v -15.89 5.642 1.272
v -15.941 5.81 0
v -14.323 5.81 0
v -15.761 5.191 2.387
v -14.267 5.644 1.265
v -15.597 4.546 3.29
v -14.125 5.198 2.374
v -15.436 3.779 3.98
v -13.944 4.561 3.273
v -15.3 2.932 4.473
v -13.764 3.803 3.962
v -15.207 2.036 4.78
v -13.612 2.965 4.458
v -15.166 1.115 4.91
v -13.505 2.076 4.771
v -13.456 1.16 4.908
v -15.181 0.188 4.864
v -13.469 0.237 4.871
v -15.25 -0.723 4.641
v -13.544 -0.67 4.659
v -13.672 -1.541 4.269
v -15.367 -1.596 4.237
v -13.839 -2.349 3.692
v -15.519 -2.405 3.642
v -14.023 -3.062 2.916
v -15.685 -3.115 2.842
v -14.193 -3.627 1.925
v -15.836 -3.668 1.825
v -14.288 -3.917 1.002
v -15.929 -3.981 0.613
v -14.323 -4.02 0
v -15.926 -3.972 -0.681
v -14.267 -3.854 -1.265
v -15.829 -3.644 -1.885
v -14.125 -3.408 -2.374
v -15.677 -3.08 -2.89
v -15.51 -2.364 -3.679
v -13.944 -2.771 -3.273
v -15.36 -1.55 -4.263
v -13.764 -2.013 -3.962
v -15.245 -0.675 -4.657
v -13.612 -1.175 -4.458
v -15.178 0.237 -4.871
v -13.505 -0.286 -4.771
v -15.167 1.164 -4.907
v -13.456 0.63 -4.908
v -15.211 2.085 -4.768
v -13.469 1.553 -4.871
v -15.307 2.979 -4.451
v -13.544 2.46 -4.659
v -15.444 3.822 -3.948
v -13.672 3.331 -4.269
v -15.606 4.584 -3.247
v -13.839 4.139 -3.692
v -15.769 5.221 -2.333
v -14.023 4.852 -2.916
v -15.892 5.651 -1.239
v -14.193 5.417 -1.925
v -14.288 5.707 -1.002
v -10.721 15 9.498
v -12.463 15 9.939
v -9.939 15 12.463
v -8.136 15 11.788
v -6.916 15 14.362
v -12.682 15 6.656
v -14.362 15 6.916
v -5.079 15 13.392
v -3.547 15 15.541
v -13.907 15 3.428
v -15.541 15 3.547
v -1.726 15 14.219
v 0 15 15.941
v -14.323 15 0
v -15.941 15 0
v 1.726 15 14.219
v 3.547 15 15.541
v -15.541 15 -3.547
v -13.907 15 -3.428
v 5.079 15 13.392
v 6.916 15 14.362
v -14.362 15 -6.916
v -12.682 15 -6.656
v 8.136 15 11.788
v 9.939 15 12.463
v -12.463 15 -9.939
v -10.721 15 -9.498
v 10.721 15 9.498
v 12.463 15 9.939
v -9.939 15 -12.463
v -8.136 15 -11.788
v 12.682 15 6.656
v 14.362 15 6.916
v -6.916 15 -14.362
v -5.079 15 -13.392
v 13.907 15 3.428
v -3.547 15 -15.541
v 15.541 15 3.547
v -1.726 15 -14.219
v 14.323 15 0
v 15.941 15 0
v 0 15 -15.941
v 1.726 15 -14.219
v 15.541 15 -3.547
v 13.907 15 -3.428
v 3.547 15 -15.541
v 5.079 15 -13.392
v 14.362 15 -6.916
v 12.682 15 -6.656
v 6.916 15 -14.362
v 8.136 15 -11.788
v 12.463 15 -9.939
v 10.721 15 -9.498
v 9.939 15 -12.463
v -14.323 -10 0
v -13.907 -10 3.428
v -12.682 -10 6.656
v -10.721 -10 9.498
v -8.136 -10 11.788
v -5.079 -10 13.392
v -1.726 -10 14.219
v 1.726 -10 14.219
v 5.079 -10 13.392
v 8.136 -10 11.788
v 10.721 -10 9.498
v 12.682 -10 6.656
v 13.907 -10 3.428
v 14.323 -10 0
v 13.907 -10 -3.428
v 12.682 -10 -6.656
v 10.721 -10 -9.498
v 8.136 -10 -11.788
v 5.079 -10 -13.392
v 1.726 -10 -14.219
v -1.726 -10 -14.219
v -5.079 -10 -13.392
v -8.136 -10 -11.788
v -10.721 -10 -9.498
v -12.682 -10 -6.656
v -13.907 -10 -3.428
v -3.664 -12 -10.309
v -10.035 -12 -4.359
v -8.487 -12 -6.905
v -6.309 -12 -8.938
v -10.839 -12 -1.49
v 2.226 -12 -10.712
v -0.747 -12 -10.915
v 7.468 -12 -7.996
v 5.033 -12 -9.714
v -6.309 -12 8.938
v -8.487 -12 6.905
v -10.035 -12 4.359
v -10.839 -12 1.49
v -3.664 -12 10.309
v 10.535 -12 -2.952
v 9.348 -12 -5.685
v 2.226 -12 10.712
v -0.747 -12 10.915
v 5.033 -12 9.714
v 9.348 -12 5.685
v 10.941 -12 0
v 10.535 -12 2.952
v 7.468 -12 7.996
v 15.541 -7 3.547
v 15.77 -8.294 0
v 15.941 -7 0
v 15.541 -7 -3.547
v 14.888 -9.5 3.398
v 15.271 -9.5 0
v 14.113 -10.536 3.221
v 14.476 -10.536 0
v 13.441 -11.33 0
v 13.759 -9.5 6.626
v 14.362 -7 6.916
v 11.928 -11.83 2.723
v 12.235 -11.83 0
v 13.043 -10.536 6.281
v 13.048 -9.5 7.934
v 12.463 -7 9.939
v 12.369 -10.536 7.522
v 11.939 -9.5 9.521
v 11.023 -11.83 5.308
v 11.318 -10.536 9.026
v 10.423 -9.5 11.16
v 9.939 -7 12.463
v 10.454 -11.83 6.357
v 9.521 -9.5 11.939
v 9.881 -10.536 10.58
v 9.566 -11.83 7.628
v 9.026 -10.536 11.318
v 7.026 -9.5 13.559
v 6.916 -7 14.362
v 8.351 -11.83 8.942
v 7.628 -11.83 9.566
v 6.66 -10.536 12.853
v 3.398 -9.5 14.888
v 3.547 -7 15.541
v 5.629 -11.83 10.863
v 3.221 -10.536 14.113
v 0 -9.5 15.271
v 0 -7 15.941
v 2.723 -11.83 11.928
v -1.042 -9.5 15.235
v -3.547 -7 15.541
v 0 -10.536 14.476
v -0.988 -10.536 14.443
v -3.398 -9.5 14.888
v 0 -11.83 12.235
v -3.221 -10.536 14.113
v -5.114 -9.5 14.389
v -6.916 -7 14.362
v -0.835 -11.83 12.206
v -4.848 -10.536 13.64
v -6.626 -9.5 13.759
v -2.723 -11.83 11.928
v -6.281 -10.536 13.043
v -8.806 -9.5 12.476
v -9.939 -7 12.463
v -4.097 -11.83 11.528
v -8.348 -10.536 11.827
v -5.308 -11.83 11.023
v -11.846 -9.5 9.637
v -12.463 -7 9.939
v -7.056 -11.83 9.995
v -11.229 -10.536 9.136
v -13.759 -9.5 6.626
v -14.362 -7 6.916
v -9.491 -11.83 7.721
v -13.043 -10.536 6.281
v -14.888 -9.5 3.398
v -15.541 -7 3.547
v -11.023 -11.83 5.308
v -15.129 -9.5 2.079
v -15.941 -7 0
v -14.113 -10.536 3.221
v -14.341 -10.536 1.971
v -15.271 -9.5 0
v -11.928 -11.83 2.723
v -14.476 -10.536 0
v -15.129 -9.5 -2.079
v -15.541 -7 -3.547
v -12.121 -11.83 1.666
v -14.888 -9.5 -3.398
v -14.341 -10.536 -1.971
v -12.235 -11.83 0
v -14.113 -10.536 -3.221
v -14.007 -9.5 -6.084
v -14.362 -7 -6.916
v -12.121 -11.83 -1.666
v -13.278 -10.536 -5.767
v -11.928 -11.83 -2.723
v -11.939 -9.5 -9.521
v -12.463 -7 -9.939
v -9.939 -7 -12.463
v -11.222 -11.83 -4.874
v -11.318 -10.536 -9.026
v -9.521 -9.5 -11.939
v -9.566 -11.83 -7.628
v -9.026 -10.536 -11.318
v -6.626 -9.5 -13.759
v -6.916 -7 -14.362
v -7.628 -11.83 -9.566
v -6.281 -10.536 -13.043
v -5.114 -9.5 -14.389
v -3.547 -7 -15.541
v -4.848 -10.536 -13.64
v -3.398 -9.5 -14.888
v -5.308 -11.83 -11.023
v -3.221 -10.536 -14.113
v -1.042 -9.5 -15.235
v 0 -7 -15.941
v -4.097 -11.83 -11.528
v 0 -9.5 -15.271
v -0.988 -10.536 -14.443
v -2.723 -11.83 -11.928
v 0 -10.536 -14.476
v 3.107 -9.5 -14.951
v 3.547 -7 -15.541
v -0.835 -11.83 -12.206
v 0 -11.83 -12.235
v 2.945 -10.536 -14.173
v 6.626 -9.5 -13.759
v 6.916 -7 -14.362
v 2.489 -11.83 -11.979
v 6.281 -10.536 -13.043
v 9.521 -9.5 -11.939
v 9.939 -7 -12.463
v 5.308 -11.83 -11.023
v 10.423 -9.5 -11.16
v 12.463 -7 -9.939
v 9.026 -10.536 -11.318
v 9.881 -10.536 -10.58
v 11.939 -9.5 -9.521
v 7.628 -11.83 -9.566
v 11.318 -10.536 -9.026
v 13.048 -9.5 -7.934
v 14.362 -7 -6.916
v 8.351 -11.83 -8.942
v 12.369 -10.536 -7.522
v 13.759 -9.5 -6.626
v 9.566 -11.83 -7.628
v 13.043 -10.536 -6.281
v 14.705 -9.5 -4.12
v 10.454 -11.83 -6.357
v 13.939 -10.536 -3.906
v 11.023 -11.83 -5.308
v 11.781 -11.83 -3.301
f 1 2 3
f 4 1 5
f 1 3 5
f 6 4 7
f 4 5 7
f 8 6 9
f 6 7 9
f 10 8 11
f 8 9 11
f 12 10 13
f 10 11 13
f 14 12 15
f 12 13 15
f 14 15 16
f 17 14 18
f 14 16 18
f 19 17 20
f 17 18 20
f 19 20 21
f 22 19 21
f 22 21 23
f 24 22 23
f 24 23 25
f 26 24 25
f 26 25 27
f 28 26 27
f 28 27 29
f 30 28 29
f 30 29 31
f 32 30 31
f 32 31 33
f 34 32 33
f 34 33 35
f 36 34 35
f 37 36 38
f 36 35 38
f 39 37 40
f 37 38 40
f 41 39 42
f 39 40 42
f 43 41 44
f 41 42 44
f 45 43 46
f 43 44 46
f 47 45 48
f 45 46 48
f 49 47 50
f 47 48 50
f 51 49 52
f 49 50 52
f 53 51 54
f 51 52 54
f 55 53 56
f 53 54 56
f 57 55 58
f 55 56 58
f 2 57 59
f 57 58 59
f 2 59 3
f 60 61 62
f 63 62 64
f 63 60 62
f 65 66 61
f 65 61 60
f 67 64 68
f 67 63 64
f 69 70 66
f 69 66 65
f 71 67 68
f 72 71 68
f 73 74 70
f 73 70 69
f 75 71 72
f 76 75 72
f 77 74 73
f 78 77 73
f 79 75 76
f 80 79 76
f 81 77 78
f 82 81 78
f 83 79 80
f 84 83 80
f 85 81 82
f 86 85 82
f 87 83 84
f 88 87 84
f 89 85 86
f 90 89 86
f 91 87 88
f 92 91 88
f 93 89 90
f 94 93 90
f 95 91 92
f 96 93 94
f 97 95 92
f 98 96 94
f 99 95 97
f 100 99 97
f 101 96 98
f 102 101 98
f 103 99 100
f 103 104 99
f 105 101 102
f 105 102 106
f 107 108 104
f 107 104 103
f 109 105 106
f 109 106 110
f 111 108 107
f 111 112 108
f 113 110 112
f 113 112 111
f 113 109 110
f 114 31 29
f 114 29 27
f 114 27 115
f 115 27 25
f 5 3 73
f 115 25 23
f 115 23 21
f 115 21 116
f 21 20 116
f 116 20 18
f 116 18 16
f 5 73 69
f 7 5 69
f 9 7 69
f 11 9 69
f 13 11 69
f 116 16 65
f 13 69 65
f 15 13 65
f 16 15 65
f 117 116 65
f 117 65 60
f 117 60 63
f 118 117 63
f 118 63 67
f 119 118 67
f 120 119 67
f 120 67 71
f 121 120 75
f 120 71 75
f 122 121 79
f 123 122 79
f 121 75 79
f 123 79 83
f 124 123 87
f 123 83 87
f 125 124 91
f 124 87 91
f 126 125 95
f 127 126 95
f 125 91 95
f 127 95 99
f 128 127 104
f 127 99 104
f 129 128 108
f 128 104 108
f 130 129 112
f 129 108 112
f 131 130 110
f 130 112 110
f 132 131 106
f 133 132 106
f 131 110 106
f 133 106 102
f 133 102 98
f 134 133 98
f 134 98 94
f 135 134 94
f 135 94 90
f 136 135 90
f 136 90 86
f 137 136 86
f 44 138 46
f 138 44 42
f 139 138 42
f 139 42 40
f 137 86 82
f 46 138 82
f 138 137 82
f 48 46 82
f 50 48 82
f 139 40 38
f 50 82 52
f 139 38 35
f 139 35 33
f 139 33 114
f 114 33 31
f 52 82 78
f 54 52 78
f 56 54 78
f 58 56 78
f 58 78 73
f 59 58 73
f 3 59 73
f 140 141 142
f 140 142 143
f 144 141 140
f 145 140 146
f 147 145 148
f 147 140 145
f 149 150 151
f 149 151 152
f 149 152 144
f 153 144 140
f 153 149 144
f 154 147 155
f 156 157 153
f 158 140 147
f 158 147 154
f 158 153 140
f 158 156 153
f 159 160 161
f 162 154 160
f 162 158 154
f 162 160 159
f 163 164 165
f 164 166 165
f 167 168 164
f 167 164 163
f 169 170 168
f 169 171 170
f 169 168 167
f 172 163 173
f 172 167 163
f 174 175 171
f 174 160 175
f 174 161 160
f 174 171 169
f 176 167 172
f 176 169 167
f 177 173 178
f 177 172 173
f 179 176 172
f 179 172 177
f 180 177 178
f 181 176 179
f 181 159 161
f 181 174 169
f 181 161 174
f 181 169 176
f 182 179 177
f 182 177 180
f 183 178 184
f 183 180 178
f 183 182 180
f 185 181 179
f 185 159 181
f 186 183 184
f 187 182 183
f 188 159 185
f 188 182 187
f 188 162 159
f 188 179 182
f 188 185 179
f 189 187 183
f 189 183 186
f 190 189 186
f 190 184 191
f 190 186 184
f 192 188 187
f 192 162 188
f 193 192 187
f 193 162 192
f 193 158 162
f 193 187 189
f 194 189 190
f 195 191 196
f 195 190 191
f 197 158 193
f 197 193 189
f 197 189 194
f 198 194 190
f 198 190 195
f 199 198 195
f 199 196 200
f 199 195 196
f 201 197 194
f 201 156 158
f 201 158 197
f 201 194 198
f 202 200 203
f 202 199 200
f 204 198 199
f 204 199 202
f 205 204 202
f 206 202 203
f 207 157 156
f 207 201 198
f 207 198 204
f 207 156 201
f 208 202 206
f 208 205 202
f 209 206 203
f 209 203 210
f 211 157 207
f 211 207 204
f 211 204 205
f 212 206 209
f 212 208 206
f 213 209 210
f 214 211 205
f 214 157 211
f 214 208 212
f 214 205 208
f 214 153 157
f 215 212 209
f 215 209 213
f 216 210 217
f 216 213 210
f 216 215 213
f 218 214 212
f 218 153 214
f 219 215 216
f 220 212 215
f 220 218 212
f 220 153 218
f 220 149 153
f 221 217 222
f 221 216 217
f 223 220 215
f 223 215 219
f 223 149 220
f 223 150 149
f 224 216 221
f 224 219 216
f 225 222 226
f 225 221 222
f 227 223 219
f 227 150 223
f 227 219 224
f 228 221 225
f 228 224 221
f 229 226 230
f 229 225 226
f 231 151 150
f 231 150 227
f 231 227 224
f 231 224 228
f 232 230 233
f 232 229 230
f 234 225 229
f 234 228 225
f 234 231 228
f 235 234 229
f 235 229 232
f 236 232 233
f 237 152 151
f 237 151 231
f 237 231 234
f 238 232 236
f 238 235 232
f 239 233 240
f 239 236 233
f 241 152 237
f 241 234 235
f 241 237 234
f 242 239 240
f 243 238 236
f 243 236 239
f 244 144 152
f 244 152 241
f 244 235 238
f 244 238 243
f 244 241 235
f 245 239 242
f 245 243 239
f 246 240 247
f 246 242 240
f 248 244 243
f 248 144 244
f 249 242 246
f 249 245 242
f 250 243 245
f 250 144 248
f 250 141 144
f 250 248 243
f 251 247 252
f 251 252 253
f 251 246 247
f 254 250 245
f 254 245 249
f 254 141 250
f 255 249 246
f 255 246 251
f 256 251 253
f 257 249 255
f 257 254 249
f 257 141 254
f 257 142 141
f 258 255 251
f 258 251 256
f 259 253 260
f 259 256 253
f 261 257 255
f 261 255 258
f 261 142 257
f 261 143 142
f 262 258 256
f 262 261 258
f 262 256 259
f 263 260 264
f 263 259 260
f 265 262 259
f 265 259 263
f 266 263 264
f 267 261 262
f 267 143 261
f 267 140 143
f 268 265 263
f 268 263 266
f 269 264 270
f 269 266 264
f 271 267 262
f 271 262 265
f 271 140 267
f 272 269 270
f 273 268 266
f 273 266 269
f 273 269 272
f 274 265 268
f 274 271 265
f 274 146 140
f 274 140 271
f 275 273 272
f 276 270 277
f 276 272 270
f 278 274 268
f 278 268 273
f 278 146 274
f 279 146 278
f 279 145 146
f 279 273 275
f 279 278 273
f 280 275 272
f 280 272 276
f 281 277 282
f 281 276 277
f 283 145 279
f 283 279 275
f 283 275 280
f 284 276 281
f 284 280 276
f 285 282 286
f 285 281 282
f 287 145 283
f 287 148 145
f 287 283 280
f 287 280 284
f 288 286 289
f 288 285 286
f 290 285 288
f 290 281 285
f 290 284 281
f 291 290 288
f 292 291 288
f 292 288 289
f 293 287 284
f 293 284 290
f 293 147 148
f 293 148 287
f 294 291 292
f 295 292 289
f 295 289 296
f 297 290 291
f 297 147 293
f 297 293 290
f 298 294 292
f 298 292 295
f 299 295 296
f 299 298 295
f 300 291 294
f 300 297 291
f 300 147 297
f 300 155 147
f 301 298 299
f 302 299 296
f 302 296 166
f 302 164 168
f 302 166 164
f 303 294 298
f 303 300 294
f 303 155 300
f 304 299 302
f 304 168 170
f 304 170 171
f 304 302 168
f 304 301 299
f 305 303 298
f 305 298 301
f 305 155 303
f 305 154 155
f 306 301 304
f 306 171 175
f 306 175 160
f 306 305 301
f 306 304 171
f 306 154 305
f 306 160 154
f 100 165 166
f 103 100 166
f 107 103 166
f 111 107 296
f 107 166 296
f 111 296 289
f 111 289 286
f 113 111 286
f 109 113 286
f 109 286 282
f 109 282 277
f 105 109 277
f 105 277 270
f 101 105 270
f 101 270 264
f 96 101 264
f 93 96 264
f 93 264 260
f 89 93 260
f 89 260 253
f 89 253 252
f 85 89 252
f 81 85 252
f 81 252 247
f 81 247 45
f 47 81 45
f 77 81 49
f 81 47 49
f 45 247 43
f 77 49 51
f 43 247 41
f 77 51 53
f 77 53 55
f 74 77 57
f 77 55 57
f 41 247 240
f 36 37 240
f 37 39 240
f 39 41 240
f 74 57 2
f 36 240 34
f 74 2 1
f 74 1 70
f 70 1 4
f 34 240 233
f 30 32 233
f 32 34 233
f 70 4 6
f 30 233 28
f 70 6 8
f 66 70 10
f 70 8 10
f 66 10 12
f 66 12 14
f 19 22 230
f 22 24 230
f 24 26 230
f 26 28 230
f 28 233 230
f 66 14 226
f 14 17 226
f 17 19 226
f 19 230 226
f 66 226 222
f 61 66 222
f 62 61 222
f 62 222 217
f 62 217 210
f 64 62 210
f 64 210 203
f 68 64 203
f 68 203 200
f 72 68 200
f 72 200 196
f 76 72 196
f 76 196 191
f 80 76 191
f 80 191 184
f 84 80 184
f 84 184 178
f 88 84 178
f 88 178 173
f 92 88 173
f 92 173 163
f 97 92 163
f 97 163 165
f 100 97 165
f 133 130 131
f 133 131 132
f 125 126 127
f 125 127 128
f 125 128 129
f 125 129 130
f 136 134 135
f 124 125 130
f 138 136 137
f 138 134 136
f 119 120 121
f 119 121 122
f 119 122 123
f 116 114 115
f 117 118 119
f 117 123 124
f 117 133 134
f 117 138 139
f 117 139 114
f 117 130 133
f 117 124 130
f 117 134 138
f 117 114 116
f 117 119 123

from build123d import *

# Parameters (mm, degrees)
F0_R      = 15.940718
F1_DEPTH  = 12
F1_FACE_R = 15.940718
F2_DEPTH  = 15
F3_R      = 14.322949
F4_DEPTH  = 25
F5_R      = 5
F6_R      = 4.914735
F7_DEPTH  = 15.941718


with BuildPart() as f1:
    # F0 (on Front) → F1 (new body)
    with BuildSketch(Plane.XZ):
        Circle(F0_R)
    extrude(amount=F1_DEPTH)

    # F1_face (on face) → F2 (join)
    with BuildSketch(Plane(origin=(0, 0, 0), x_dir=(1, 0, 0), z_dir=(0, 1, 0))):
        Circle(F1_FACE_R)
    extrude(amount=F2_DEPTH)

    # F3 (on face) → F4 (cut)
    with BuildSketch(Plane(origin=(0, 15, 0), x_dir=(-1, 0, 0), z_dir=(0, 1, 0))):
        Circle(F3_R)
    extrude(amount=-F4_DEPTH, mode=Mode.SUBTRACT)

    # F5
    f5_edges = [f1.edges().sort_by_distance(p)[0] for p in [
        (-15.940718, -12, 0),
    ]]
    fillet(f5_edges, radius=F5_R)

    # F6 (on Right) → F7 (cut, through all)
    with BuildSketch(Plane.YZ):
        with Locations((0.894999, 0)):
            Circle(F6_R)
    extrude(amount=-F7_DEPTH, mode=Mode.SUBTRACT)


solid = f1.part
